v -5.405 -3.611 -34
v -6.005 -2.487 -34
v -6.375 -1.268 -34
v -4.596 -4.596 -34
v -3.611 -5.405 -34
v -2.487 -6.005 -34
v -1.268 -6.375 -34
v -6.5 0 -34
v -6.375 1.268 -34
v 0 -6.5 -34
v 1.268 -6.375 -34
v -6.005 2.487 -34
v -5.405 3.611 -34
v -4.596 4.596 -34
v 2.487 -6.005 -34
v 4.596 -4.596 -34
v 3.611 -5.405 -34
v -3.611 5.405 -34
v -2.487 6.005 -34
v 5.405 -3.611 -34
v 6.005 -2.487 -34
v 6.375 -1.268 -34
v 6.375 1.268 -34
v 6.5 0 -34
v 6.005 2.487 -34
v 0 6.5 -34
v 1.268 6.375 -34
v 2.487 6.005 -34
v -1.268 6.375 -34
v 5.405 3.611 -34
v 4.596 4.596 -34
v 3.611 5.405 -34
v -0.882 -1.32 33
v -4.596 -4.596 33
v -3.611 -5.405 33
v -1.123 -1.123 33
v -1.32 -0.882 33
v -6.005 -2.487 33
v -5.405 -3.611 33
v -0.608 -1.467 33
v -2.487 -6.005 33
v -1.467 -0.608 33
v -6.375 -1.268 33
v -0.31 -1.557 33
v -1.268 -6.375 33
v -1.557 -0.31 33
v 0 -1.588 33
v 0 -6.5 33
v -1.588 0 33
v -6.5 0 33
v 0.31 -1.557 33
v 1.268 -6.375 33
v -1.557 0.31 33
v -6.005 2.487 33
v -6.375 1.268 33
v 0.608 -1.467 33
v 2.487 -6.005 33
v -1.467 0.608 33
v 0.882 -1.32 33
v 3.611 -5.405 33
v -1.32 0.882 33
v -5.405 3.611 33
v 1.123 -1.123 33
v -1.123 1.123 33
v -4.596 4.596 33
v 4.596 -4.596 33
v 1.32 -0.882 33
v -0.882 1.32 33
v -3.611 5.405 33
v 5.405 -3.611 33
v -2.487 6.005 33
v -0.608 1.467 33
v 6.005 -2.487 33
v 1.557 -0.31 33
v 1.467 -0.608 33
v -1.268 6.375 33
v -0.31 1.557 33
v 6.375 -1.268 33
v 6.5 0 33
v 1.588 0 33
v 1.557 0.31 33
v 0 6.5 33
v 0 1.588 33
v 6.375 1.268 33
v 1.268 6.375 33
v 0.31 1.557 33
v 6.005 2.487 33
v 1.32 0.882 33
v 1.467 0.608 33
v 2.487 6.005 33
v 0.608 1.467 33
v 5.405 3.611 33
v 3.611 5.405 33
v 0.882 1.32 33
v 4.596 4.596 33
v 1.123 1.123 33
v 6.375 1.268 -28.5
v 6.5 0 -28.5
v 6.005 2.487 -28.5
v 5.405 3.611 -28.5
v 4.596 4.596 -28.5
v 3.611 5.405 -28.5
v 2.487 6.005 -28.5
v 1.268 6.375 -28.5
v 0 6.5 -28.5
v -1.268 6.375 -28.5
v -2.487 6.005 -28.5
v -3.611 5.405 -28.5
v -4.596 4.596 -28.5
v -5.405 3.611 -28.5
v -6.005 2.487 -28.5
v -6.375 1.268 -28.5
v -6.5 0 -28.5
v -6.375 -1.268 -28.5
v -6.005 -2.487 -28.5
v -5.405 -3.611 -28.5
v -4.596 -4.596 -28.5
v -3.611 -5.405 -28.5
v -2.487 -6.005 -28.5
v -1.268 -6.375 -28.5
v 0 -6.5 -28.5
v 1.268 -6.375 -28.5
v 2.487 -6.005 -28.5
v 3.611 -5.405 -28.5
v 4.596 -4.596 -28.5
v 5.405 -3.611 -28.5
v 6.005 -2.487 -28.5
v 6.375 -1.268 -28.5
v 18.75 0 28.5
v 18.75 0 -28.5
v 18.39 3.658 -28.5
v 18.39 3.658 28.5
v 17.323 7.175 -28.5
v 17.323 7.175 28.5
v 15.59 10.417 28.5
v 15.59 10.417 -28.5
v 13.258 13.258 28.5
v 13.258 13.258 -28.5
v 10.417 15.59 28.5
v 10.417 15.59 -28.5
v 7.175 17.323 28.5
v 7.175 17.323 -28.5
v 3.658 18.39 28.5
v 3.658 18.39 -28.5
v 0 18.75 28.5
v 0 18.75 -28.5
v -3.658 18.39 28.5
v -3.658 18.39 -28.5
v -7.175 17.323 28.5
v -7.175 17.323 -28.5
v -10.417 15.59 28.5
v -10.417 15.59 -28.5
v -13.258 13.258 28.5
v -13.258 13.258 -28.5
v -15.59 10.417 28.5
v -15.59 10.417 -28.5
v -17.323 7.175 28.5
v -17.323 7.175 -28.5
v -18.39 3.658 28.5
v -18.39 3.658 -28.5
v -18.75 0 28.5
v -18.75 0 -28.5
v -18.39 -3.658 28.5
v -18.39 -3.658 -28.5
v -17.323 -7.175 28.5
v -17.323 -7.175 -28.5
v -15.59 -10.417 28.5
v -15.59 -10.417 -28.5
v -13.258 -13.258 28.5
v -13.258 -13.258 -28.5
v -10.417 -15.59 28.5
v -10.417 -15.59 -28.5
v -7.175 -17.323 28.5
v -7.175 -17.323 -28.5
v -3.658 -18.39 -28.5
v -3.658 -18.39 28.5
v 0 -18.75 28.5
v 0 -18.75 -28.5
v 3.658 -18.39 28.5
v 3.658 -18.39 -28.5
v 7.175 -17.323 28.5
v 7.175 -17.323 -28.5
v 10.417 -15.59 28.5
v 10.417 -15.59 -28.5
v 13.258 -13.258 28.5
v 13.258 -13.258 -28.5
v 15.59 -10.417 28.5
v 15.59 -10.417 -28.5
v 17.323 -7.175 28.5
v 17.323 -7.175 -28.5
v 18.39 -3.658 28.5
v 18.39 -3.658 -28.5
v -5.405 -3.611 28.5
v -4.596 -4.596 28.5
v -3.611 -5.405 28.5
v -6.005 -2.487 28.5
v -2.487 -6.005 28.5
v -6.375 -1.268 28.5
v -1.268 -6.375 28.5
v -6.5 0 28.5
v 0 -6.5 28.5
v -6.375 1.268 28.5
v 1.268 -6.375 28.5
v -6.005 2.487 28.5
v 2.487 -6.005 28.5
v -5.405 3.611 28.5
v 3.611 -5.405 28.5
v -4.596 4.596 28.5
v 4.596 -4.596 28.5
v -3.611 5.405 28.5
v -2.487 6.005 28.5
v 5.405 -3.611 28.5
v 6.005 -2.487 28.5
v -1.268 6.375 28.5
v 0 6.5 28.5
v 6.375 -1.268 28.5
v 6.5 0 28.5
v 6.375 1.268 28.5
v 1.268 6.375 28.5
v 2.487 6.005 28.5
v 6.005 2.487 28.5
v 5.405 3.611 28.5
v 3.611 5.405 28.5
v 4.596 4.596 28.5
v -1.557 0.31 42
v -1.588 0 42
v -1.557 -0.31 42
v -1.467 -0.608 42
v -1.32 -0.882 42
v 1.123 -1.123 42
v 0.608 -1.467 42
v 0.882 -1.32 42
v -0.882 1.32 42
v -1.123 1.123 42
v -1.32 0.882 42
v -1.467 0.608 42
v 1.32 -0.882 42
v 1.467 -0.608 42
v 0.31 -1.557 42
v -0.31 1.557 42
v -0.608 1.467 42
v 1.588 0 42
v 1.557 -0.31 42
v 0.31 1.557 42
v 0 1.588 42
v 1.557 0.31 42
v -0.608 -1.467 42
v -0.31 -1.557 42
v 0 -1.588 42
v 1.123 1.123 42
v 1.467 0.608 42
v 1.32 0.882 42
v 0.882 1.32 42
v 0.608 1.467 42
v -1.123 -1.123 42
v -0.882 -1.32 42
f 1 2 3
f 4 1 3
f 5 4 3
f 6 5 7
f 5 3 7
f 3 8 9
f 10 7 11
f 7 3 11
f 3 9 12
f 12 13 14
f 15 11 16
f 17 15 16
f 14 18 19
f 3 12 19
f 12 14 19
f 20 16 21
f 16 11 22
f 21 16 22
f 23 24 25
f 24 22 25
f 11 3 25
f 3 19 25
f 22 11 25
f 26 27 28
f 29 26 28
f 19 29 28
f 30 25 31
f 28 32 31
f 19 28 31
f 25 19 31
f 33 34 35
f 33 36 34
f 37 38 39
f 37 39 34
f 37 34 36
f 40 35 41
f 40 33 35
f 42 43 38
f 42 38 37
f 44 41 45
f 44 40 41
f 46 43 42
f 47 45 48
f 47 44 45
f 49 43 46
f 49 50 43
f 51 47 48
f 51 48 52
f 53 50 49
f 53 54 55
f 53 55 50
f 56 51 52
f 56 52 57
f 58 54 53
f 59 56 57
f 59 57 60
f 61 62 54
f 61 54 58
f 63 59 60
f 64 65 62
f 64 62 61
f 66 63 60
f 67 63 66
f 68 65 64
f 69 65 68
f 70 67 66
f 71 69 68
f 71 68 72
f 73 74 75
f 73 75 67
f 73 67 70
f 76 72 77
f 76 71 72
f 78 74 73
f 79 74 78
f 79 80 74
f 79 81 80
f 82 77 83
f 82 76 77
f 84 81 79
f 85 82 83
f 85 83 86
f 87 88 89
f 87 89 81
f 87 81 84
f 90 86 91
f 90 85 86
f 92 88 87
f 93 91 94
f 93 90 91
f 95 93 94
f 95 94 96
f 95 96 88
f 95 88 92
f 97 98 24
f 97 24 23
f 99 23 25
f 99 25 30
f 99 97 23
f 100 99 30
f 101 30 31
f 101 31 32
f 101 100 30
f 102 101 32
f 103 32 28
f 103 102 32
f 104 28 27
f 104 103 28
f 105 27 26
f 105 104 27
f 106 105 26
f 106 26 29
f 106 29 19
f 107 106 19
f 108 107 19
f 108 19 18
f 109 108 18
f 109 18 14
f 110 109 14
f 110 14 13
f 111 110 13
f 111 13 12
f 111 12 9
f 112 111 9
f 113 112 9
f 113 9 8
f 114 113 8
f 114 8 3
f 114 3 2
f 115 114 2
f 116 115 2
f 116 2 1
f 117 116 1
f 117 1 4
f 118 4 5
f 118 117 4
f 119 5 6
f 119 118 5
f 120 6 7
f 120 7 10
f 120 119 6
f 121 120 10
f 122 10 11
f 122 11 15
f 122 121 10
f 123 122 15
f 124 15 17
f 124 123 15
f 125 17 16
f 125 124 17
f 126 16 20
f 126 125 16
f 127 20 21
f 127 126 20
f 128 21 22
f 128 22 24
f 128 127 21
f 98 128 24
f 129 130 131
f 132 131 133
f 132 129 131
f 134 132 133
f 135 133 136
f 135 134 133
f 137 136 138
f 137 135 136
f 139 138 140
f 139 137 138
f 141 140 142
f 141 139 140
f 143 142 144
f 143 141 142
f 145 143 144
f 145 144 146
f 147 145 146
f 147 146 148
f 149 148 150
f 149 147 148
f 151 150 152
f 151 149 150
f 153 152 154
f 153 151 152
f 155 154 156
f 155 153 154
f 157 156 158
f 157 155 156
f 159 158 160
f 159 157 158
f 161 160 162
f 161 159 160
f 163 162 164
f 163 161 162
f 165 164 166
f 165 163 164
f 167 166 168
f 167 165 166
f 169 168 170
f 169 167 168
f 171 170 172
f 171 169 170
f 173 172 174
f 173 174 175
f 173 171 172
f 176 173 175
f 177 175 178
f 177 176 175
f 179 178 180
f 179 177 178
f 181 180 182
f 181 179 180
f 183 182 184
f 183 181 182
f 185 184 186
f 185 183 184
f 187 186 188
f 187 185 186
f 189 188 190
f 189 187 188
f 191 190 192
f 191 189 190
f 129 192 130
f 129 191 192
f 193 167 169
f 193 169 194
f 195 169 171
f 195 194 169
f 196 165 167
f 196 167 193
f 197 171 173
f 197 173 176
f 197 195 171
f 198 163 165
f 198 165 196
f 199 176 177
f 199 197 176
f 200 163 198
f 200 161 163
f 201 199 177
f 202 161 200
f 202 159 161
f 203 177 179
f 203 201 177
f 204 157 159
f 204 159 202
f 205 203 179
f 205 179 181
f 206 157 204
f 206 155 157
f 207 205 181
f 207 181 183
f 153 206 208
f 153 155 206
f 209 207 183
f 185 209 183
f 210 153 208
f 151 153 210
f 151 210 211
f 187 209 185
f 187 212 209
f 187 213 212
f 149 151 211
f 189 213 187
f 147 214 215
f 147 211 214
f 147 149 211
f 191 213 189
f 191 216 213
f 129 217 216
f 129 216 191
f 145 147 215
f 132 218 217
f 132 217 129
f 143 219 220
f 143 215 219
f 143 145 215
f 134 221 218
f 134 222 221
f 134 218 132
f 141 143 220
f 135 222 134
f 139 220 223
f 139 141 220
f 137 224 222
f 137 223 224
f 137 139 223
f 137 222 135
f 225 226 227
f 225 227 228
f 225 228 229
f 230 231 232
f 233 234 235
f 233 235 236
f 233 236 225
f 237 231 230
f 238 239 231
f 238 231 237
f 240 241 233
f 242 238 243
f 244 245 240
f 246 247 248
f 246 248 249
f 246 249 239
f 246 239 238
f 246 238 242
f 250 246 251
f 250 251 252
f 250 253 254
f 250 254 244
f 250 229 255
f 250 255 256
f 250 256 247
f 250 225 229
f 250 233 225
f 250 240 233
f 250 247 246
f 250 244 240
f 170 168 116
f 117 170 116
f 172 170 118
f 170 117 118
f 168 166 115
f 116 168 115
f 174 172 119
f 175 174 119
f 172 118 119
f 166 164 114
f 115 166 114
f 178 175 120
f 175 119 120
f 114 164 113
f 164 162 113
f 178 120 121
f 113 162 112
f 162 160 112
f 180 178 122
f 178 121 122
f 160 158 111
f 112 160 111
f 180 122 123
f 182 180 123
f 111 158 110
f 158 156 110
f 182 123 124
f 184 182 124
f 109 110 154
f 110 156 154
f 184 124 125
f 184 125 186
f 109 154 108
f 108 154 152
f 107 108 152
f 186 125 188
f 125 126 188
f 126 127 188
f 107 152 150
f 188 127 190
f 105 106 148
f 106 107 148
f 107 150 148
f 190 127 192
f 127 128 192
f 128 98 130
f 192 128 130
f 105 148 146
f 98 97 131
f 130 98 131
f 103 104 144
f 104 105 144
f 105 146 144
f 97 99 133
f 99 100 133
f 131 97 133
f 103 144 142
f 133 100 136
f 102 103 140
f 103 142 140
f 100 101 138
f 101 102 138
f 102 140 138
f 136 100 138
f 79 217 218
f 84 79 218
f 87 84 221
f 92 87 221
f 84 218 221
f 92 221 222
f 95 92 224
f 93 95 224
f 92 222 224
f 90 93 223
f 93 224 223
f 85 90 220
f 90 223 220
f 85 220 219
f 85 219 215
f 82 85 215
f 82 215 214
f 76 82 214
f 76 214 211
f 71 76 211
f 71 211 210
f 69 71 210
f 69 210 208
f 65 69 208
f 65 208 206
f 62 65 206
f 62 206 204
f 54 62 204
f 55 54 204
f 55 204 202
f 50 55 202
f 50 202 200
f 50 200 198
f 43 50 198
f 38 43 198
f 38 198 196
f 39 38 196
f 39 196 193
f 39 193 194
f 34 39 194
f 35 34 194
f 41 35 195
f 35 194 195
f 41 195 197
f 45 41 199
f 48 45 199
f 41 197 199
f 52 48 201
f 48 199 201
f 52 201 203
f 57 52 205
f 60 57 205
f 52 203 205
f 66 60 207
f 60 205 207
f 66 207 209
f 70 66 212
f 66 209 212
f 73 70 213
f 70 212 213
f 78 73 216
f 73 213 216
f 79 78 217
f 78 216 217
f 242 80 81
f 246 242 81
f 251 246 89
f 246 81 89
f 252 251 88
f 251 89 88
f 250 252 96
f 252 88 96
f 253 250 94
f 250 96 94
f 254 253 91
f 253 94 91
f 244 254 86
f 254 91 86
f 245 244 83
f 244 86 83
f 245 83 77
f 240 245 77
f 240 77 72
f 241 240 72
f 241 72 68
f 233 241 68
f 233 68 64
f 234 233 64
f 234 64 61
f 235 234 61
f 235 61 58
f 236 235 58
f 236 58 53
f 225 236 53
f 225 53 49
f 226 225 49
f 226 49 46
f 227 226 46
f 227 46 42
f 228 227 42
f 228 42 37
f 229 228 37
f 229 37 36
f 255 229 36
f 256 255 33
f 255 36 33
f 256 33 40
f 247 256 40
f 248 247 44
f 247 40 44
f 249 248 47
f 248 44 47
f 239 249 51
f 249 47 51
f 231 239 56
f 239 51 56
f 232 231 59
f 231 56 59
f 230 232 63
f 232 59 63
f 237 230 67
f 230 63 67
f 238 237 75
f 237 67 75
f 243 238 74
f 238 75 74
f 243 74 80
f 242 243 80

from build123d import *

# Parameters (mm, degrees)
F0_R     = 6.5
F1_DEPTH = 33
F0_R_2   = 18.75
F2_DEPTH = 28.5
F3_R     = 6.5
F4_DEPTH = 34
F5_R     = 1.5875
F6_DEPTH = 42


with BuildPart() as f1:
    # F0 (on Top) → F1 (new body)
    with BuildSketch(Plane.XY):
        Circle(F0_R)
    extrude(amount=F1_DEPTH)

    # F0 (on Top) → F2 (join, symmetric)
    with BuildSketch(Plane.XY):
        Circle(F0_R_2)
        Circle(F0_R, mode=Mode.SUBTRACT)
    extrude(amount=F2_DEPTH, both=True)

    # F3 (on Top) → F4 (join)
    with BuildSketch(Plane.XY):
        Circle(F3_R)
    extrude(amount=-F4_DEPTH)

    # F5 (on Top) → F6 (join)
    with BuildSketch(Plane.XY):
        Circle(F5_R)
    extrude(amount=F6_DEPTH)


solid = f1.part
